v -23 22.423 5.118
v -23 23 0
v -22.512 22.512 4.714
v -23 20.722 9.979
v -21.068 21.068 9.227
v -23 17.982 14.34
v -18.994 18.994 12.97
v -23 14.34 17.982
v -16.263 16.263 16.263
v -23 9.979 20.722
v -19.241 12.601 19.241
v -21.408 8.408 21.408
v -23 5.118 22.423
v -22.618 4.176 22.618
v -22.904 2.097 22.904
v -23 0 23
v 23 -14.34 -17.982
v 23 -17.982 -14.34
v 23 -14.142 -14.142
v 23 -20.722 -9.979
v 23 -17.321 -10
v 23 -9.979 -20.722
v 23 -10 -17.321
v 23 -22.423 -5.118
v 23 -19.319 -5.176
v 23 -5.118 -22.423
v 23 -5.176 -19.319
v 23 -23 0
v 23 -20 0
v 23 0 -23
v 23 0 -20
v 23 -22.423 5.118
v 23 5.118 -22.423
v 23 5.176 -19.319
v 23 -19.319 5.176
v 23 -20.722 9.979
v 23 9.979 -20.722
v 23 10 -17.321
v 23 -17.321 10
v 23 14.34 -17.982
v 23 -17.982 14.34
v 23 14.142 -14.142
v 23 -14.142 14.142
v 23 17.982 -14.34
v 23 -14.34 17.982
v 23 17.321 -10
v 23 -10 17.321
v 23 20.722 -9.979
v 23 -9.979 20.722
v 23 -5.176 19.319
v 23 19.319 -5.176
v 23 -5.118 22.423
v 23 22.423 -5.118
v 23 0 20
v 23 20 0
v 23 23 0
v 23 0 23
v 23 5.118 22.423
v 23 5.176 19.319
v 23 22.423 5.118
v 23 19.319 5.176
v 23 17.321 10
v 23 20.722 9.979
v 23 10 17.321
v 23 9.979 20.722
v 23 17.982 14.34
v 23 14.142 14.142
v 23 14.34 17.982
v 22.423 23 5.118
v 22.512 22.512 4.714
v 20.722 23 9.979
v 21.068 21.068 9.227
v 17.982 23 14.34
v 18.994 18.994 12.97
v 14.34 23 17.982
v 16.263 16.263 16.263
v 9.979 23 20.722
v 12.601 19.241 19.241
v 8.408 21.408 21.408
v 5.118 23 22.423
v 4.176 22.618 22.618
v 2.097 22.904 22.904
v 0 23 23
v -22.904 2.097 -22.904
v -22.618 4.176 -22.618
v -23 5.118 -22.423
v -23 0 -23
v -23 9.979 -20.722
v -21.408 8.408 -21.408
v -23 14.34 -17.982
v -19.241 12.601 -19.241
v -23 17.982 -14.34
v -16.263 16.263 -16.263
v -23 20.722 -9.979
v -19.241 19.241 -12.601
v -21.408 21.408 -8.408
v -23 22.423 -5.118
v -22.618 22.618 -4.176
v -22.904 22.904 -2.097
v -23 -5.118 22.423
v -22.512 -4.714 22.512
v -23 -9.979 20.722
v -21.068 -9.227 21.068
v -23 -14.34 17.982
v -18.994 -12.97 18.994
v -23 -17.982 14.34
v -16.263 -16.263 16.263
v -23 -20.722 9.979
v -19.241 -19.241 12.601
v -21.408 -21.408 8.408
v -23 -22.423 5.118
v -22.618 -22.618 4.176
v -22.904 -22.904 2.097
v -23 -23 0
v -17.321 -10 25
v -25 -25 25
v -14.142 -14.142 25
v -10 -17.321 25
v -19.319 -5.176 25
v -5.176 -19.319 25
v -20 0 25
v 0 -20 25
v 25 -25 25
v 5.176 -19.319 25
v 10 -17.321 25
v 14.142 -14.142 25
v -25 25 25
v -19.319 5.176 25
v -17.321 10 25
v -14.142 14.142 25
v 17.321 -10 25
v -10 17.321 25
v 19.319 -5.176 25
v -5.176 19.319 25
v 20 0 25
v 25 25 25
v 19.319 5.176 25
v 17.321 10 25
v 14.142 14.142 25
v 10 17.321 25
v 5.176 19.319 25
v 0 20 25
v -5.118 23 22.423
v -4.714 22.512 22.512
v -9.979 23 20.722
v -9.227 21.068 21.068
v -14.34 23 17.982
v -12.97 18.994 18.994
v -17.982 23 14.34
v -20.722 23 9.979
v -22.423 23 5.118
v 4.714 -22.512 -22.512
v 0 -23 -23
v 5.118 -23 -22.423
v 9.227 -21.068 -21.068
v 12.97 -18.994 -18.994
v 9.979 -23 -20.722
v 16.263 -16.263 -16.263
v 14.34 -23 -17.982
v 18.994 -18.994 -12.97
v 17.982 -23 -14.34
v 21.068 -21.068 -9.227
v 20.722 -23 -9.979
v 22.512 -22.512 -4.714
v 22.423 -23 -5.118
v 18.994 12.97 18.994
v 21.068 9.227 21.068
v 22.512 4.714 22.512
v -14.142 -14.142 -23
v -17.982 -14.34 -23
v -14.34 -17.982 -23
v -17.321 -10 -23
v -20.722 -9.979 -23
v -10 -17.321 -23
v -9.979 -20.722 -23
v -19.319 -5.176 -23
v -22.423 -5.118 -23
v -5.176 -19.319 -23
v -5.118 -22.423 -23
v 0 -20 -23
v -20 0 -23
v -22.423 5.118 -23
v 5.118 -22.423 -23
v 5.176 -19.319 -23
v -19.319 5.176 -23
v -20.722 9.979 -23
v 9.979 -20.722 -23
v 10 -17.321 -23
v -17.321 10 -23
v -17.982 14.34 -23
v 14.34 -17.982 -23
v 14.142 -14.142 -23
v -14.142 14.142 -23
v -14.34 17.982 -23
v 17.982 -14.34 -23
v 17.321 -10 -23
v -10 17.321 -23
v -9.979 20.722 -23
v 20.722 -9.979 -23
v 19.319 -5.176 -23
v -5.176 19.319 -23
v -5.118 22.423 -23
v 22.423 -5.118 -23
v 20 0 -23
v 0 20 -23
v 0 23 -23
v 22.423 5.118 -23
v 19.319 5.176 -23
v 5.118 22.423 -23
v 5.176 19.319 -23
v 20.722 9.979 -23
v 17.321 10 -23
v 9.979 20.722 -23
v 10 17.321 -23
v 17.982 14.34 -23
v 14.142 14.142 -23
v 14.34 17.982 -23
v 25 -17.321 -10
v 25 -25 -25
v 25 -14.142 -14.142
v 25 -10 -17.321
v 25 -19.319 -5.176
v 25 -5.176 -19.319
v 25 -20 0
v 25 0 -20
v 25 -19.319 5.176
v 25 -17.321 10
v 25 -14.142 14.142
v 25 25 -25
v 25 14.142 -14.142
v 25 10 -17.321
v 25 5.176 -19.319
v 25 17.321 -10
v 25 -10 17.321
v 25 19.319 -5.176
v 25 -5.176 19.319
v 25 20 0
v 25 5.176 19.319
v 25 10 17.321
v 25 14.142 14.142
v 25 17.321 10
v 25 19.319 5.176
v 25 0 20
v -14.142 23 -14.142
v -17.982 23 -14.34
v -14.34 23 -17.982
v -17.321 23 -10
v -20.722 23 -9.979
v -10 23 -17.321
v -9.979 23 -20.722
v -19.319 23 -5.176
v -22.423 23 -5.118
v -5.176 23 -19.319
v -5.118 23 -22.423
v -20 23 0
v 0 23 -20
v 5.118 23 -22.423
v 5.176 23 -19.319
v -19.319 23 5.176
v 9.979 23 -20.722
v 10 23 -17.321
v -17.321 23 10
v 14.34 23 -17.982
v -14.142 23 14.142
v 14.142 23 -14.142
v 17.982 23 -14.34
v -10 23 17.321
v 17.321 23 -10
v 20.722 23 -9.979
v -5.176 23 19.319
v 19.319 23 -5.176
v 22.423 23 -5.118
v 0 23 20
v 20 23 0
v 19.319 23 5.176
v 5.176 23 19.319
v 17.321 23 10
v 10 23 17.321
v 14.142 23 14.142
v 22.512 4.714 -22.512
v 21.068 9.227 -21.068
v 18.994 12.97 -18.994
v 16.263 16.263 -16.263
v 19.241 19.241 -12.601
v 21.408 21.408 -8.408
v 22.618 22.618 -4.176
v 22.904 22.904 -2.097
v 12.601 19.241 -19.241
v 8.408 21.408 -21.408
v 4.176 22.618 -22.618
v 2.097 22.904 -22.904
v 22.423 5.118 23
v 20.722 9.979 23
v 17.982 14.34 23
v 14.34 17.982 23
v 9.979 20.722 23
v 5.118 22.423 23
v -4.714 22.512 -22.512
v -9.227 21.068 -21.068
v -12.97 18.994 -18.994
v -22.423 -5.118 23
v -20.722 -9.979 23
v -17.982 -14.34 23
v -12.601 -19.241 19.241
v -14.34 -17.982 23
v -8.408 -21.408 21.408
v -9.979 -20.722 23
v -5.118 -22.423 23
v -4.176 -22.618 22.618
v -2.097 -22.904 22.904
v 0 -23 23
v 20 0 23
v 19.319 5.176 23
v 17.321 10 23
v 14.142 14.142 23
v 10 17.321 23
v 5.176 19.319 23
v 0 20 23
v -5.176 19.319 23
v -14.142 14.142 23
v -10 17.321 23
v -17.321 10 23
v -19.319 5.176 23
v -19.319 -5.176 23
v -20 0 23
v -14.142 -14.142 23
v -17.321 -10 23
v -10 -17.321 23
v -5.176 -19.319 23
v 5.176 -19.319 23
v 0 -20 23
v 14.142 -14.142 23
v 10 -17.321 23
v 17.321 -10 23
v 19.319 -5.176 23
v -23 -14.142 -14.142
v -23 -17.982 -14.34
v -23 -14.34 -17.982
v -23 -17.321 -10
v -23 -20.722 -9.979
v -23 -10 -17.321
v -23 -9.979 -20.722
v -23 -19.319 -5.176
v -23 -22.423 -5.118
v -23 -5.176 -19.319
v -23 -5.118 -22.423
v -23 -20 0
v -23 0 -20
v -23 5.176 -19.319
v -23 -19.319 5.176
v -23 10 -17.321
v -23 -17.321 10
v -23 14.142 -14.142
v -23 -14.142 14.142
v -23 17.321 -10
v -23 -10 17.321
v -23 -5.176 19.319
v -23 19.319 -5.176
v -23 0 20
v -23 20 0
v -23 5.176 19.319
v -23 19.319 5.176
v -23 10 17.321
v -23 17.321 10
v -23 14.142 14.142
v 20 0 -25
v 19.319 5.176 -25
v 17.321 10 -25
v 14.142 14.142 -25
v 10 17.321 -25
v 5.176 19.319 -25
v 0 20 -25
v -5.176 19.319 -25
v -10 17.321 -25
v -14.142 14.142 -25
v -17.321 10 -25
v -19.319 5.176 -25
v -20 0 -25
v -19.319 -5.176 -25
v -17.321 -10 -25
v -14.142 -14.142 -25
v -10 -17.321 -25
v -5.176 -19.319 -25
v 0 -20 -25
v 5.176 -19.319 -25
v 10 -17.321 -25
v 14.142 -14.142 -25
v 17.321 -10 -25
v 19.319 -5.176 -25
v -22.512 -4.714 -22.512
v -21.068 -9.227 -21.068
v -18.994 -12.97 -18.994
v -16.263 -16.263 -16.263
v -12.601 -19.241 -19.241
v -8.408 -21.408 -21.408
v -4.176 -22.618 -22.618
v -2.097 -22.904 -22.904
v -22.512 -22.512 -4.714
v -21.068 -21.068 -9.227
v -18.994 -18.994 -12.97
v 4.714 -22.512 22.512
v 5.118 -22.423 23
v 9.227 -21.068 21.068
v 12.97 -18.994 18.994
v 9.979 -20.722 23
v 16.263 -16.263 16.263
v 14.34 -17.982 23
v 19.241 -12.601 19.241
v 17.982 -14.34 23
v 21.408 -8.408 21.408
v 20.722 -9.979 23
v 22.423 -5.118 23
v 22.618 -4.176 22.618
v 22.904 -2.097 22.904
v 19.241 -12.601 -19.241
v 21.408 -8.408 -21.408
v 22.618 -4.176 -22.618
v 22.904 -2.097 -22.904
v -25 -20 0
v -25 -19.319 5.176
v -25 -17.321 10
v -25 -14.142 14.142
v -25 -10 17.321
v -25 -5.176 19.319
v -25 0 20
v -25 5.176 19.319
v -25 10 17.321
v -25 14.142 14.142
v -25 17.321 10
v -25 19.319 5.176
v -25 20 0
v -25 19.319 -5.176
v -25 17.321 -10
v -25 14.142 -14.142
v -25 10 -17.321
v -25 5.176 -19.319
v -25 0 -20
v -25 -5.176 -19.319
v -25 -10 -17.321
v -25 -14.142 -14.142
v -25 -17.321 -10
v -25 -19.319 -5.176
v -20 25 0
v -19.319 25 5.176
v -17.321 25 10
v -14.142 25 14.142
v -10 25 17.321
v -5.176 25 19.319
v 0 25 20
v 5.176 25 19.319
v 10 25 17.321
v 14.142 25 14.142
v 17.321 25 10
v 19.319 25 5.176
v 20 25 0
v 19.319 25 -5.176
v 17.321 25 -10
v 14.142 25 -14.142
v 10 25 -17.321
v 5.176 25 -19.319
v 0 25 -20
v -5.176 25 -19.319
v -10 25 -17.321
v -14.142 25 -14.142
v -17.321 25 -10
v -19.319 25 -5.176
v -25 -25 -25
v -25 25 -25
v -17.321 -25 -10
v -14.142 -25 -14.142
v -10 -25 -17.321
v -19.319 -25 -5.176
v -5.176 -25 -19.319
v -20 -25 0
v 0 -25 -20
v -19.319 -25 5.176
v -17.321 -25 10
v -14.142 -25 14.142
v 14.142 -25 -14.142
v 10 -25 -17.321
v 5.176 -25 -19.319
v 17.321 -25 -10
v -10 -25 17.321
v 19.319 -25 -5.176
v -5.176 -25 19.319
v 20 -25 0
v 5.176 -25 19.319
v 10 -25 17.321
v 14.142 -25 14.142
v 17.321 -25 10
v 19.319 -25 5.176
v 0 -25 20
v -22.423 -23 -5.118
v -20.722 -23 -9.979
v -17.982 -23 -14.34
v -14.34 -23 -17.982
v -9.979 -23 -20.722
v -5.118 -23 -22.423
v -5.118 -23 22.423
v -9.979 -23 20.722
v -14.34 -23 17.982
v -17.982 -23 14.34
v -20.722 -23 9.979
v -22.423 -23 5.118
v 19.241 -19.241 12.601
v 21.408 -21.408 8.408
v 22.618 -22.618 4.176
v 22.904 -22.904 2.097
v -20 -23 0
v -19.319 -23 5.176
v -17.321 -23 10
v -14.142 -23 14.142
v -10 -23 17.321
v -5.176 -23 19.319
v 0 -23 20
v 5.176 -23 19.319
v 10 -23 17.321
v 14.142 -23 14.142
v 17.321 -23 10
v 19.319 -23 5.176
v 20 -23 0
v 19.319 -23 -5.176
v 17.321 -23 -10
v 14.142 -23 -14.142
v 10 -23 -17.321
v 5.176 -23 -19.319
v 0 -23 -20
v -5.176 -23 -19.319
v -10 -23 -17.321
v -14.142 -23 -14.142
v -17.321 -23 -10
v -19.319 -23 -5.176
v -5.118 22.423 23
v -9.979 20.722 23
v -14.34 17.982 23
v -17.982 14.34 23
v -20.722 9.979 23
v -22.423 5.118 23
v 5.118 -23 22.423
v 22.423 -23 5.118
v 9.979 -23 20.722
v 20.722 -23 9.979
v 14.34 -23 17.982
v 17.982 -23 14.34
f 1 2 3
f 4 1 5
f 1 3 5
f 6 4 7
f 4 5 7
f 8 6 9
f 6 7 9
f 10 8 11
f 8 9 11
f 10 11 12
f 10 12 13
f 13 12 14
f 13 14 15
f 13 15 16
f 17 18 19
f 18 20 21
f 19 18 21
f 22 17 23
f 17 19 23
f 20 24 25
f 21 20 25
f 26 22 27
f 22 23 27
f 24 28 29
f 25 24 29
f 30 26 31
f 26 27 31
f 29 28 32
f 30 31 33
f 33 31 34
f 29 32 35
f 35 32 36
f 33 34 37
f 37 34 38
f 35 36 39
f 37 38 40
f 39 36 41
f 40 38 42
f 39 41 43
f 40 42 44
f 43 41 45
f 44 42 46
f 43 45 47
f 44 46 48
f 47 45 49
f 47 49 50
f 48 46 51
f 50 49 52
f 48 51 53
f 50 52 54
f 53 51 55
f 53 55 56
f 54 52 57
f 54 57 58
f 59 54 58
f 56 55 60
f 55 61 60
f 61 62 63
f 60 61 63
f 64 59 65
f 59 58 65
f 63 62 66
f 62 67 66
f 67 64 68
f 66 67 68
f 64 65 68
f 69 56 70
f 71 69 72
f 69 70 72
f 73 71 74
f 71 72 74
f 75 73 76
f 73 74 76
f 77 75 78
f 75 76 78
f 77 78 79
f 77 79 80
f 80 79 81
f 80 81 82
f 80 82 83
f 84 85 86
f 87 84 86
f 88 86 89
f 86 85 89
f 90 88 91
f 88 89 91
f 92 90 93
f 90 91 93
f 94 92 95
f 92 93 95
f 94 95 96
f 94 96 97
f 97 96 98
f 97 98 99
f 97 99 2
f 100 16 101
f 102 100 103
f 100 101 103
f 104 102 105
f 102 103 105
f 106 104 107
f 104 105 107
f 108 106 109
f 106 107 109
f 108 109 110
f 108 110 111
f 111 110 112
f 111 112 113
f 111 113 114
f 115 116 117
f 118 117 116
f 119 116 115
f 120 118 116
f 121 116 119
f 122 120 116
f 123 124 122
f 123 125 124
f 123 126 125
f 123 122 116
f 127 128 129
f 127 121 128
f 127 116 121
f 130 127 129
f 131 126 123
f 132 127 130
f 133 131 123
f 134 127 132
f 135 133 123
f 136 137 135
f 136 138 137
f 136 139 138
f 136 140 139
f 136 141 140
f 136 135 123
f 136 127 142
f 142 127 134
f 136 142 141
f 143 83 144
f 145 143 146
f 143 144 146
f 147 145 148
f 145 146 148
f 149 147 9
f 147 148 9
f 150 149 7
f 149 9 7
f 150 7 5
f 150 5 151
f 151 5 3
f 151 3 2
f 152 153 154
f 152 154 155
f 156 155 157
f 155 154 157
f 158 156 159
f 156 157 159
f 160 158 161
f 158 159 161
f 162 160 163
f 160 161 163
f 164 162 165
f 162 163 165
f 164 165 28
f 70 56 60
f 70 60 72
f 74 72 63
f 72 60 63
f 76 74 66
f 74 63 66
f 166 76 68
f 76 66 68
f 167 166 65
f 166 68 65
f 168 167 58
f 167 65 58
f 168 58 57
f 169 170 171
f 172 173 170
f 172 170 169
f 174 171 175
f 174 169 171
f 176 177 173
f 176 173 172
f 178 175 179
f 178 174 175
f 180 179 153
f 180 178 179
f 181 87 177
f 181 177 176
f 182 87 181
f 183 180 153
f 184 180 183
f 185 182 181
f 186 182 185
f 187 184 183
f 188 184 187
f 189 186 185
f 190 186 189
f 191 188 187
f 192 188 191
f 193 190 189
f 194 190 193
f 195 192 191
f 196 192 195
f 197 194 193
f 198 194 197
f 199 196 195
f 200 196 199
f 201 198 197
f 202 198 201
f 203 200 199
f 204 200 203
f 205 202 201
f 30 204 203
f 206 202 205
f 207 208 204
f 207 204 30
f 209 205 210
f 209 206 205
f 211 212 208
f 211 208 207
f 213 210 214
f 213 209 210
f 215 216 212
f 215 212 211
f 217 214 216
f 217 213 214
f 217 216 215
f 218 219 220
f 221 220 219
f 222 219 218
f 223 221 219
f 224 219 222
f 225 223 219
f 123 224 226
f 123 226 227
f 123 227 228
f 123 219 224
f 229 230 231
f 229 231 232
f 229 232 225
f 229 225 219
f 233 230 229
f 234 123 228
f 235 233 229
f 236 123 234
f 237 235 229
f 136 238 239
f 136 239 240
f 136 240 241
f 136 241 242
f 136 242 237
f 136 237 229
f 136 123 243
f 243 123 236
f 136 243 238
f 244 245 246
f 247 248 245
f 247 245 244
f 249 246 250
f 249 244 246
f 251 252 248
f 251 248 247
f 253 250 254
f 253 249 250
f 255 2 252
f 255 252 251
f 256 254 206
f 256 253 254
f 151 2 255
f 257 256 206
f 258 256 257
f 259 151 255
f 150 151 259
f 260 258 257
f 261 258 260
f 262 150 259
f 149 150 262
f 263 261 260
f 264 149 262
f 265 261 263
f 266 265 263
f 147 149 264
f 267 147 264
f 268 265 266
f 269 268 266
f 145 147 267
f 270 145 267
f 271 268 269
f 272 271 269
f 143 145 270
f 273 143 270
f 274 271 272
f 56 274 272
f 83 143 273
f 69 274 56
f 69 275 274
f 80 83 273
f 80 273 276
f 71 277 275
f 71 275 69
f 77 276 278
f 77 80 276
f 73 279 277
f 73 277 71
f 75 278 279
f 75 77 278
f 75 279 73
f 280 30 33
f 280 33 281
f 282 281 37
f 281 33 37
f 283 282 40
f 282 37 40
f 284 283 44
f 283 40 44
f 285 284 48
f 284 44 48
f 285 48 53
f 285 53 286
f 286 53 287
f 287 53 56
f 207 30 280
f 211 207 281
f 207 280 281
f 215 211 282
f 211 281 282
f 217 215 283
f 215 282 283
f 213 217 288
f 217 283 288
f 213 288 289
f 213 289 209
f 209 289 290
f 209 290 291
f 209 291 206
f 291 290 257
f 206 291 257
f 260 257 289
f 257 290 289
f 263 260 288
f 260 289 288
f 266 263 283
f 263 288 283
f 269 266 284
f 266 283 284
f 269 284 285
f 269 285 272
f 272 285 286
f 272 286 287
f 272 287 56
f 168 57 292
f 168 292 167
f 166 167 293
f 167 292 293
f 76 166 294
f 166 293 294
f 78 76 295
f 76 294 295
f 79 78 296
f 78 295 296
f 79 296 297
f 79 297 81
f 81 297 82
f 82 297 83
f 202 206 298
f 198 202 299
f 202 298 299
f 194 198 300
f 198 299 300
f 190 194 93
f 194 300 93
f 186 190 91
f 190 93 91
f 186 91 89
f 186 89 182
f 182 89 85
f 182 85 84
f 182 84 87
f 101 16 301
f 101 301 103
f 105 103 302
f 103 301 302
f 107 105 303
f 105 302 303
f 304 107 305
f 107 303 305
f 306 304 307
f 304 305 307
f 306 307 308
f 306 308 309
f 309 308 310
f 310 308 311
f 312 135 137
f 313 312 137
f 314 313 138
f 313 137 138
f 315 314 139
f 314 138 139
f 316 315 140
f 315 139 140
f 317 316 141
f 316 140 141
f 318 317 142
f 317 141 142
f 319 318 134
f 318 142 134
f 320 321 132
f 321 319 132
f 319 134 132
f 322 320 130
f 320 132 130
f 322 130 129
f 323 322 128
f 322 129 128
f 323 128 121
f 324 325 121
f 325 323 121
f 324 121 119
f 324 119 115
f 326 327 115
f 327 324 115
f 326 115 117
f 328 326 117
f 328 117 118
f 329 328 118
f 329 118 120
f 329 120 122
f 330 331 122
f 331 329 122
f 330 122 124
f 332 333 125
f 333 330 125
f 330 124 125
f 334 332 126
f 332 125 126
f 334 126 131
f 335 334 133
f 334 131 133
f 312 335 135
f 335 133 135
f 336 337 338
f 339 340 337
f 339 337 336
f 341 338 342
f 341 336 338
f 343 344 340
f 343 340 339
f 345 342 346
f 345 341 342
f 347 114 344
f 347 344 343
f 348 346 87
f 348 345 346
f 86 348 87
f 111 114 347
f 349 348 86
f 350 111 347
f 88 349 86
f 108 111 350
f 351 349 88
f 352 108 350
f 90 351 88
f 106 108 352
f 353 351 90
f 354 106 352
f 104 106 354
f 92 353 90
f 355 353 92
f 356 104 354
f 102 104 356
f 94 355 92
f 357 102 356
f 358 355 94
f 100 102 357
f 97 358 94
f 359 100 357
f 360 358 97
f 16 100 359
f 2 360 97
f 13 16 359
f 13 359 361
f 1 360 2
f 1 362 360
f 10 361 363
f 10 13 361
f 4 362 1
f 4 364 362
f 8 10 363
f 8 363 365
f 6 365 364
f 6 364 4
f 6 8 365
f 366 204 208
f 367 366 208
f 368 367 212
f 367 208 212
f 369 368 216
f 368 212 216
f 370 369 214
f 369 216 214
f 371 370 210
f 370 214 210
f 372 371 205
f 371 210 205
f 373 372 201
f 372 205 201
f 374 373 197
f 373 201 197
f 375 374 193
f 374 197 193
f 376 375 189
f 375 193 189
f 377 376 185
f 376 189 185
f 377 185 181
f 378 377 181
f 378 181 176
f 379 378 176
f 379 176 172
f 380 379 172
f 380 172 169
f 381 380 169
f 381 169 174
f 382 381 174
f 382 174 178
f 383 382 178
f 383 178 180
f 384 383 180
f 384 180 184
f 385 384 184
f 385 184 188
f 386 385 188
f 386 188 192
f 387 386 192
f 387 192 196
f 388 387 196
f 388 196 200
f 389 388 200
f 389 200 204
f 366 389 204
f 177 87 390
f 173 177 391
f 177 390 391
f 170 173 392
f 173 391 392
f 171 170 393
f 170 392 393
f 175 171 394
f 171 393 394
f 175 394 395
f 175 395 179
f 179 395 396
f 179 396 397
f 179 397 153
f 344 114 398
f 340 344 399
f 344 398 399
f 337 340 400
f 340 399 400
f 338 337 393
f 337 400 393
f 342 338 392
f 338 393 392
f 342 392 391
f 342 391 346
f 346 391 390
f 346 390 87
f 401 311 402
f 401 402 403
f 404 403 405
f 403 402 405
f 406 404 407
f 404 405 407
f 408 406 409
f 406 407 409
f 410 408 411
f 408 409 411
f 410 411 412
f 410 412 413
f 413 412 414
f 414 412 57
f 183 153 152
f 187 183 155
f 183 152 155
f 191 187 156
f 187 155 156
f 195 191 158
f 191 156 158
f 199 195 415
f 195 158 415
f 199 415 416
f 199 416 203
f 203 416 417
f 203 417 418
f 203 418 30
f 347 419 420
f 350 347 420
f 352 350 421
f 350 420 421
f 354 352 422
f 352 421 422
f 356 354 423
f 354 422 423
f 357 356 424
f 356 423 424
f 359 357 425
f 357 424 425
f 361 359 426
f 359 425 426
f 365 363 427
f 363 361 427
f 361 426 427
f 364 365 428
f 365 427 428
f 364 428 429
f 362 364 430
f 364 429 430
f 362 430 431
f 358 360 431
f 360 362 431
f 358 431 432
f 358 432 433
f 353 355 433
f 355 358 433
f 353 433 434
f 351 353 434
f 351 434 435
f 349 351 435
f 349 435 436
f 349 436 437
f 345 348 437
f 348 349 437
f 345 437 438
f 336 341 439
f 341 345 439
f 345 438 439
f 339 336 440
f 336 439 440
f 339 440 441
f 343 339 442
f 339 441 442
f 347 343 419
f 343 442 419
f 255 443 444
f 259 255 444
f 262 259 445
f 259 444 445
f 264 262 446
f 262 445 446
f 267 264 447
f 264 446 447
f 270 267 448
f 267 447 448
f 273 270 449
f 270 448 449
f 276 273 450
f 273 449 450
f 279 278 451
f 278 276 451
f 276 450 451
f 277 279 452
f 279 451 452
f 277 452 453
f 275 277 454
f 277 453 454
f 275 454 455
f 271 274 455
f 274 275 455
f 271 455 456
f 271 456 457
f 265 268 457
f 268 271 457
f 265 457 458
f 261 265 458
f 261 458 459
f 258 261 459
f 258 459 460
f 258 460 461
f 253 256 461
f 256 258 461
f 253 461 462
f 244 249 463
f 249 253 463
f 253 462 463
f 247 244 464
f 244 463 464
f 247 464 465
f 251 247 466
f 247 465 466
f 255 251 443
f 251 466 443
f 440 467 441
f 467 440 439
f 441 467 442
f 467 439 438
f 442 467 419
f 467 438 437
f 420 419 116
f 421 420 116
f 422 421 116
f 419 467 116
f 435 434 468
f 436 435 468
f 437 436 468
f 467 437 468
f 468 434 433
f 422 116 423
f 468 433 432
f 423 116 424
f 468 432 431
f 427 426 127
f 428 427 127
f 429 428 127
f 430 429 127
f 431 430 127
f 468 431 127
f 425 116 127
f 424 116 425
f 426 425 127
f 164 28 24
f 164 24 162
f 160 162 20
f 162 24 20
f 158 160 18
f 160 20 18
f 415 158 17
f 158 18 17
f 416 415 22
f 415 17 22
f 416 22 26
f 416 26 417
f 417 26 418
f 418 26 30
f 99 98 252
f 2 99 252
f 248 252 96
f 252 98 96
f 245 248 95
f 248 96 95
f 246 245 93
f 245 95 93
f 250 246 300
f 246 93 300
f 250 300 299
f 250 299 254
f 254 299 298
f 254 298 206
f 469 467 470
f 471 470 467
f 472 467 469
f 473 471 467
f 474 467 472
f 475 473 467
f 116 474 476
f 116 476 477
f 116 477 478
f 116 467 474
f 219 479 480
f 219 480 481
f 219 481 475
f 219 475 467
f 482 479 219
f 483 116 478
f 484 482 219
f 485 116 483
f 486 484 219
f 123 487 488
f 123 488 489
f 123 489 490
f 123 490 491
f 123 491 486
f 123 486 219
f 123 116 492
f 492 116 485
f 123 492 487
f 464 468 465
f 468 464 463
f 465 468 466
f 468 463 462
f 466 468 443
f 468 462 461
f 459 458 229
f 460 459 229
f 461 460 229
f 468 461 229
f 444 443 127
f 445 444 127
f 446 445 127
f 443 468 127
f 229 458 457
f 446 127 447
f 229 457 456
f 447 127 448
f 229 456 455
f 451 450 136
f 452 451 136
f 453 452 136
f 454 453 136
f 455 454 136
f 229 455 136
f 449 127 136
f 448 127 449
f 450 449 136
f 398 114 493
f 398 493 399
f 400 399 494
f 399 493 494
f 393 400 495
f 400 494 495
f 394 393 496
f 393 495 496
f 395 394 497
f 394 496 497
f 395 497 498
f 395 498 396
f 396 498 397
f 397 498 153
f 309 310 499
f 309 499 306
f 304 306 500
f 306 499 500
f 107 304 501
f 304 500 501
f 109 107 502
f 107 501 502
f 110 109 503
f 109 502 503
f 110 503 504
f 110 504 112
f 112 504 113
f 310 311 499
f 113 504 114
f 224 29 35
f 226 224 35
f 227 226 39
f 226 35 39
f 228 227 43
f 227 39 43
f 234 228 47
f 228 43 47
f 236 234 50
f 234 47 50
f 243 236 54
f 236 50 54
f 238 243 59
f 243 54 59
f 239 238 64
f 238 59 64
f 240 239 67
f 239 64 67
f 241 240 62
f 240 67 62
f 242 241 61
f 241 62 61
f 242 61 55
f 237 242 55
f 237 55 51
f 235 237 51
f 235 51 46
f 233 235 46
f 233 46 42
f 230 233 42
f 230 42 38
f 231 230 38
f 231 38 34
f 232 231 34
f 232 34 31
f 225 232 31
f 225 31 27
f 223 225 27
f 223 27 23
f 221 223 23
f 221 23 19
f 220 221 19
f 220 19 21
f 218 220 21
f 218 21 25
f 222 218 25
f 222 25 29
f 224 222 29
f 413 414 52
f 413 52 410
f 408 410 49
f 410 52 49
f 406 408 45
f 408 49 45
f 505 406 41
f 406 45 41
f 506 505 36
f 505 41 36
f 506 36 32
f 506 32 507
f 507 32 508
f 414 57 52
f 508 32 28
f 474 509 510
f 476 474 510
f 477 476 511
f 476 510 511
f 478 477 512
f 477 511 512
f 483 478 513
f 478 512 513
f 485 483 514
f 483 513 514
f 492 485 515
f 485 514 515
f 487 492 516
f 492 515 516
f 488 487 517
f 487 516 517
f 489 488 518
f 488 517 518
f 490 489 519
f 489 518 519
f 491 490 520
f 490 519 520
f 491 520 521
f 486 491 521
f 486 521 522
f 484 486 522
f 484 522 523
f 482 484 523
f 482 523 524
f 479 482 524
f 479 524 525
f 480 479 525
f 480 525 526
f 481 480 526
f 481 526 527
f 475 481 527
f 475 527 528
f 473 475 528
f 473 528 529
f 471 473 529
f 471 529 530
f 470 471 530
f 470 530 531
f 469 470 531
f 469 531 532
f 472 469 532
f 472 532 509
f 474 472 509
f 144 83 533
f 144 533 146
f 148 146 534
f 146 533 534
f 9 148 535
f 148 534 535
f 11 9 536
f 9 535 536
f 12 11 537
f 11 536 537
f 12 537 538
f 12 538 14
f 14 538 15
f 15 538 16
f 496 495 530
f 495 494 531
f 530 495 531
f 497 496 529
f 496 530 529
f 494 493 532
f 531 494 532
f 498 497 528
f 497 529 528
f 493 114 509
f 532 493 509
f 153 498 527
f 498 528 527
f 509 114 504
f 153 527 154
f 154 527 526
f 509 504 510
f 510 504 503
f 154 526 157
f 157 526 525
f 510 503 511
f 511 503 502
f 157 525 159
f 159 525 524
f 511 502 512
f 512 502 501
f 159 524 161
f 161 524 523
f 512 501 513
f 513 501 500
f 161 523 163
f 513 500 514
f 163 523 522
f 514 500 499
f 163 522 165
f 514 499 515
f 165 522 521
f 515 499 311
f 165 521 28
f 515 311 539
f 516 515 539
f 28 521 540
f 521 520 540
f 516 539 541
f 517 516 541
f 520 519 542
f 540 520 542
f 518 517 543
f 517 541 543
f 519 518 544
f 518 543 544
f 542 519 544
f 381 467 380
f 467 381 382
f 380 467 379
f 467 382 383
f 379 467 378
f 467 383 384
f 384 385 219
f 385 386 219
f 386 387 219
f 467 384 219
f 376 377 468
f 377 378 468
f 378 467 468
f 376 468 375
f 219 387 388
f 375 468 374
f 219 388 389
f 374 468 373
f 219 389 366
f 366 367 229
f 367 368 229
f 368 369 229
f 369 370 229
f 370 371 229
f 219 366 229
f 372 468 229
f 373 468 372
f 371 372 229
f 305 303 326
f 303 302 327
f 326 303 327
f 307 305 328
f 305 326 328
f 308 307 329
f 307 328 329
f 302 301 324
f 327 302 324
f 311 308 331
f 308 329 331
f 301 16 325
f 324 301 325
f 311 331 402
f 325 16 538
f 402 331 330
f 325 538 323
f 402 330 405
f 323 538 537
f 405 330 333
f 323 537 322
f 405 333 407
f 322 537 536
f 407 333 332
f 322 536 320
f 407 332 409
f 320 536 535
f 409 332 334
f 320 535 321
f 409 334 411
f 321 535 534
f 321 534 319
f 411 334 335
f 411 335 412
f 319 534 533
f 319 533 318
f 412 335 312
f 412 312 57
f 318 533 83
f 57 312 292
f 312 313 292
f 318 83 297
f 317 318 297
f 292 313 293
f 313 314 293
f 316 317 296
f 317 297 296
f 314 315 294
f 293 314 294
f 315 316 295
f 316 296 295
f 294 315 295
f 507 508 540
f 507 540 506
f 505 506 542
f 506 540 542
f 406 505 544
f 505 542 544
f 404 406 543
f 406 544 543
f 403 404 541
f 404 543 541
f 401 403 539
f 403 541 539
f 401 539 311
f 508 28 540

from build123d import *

# Parameters (mm, degrees)
F0_W      = 50
F0_H      = 50
F1_DEPTH  = 25
F2_R      = 20
F3_DEPTH  = 50.001
F4_R      = 20
F5_DEPTH  = 50.001
F6_R      = 20
F7_DEPTH  = 50.001
F8_R      = 23
F9_DEPTH  = 23
F10_R     = 23
F11_DEPTH = 23
F12_R     = 23
F13_DEPTH = 23


with BuildPart() as f1:
    # F0 (on Top) → F1 (new body, symmetric)
    with BuildSketch(Plane.XY):
        Rectangle(F0_W, F0_H)
    extrude(amount=F1_DEPTH, both=True)

    # F2 (on face) → F3 (cut, through all)
    with BuildSketch(Plane(origin=(0, 25, 0), x_dir=(-1, 0, 0), z_dir=(0, 1, 0))):
        Circle(F2_R)
    extrude(amount=-F3_DEPTH, mode=Mode.SUBTRACT)

    # F4 (on face) → F5 (cut, through all)
    with BuildSketch(Plane(origin=(-25, 0, 0), x_dir=(0, -1, 0), z_dir=(-1, 0, 0))):
        Circle(F4_R)
    extrude(amount=-F5_DEPTH, mode=Mode.SUBTRACT)

    # F6 (on face) → F7 (cut, through all)
    with BuildSketch(Plane.XY.offset(25)):
        Circle(F6_R)
    extrude(amount=-F7_DEPTH, mode=Mode.SUBTRACT)

    # F8 (on Top) → F9 (cut, symmetric)
    with BuildSketch(Plane.XY):
        Circle(F8_R)
    extrude(amount=F9_DEPTH, both=True, mode=Mode.SUBTRACT)

    # F10 (on Right) → F11 (cut, symmetric)
    with BuildSketch(Plane.YZ):
        Circle(F10_R)
    extrude(amount=F11_DEPTH, both=True, mode=Mode.SUBTRACT)

    # F12 (on Front) → F13 (cut, symmetric)
    with BuildSketch(Plane.XZ):
        Circle(F12_R)
    extrude(amount=F13_DEPTH, both=True, mode=Mode.SUBTRACT)


solid = f1.part
